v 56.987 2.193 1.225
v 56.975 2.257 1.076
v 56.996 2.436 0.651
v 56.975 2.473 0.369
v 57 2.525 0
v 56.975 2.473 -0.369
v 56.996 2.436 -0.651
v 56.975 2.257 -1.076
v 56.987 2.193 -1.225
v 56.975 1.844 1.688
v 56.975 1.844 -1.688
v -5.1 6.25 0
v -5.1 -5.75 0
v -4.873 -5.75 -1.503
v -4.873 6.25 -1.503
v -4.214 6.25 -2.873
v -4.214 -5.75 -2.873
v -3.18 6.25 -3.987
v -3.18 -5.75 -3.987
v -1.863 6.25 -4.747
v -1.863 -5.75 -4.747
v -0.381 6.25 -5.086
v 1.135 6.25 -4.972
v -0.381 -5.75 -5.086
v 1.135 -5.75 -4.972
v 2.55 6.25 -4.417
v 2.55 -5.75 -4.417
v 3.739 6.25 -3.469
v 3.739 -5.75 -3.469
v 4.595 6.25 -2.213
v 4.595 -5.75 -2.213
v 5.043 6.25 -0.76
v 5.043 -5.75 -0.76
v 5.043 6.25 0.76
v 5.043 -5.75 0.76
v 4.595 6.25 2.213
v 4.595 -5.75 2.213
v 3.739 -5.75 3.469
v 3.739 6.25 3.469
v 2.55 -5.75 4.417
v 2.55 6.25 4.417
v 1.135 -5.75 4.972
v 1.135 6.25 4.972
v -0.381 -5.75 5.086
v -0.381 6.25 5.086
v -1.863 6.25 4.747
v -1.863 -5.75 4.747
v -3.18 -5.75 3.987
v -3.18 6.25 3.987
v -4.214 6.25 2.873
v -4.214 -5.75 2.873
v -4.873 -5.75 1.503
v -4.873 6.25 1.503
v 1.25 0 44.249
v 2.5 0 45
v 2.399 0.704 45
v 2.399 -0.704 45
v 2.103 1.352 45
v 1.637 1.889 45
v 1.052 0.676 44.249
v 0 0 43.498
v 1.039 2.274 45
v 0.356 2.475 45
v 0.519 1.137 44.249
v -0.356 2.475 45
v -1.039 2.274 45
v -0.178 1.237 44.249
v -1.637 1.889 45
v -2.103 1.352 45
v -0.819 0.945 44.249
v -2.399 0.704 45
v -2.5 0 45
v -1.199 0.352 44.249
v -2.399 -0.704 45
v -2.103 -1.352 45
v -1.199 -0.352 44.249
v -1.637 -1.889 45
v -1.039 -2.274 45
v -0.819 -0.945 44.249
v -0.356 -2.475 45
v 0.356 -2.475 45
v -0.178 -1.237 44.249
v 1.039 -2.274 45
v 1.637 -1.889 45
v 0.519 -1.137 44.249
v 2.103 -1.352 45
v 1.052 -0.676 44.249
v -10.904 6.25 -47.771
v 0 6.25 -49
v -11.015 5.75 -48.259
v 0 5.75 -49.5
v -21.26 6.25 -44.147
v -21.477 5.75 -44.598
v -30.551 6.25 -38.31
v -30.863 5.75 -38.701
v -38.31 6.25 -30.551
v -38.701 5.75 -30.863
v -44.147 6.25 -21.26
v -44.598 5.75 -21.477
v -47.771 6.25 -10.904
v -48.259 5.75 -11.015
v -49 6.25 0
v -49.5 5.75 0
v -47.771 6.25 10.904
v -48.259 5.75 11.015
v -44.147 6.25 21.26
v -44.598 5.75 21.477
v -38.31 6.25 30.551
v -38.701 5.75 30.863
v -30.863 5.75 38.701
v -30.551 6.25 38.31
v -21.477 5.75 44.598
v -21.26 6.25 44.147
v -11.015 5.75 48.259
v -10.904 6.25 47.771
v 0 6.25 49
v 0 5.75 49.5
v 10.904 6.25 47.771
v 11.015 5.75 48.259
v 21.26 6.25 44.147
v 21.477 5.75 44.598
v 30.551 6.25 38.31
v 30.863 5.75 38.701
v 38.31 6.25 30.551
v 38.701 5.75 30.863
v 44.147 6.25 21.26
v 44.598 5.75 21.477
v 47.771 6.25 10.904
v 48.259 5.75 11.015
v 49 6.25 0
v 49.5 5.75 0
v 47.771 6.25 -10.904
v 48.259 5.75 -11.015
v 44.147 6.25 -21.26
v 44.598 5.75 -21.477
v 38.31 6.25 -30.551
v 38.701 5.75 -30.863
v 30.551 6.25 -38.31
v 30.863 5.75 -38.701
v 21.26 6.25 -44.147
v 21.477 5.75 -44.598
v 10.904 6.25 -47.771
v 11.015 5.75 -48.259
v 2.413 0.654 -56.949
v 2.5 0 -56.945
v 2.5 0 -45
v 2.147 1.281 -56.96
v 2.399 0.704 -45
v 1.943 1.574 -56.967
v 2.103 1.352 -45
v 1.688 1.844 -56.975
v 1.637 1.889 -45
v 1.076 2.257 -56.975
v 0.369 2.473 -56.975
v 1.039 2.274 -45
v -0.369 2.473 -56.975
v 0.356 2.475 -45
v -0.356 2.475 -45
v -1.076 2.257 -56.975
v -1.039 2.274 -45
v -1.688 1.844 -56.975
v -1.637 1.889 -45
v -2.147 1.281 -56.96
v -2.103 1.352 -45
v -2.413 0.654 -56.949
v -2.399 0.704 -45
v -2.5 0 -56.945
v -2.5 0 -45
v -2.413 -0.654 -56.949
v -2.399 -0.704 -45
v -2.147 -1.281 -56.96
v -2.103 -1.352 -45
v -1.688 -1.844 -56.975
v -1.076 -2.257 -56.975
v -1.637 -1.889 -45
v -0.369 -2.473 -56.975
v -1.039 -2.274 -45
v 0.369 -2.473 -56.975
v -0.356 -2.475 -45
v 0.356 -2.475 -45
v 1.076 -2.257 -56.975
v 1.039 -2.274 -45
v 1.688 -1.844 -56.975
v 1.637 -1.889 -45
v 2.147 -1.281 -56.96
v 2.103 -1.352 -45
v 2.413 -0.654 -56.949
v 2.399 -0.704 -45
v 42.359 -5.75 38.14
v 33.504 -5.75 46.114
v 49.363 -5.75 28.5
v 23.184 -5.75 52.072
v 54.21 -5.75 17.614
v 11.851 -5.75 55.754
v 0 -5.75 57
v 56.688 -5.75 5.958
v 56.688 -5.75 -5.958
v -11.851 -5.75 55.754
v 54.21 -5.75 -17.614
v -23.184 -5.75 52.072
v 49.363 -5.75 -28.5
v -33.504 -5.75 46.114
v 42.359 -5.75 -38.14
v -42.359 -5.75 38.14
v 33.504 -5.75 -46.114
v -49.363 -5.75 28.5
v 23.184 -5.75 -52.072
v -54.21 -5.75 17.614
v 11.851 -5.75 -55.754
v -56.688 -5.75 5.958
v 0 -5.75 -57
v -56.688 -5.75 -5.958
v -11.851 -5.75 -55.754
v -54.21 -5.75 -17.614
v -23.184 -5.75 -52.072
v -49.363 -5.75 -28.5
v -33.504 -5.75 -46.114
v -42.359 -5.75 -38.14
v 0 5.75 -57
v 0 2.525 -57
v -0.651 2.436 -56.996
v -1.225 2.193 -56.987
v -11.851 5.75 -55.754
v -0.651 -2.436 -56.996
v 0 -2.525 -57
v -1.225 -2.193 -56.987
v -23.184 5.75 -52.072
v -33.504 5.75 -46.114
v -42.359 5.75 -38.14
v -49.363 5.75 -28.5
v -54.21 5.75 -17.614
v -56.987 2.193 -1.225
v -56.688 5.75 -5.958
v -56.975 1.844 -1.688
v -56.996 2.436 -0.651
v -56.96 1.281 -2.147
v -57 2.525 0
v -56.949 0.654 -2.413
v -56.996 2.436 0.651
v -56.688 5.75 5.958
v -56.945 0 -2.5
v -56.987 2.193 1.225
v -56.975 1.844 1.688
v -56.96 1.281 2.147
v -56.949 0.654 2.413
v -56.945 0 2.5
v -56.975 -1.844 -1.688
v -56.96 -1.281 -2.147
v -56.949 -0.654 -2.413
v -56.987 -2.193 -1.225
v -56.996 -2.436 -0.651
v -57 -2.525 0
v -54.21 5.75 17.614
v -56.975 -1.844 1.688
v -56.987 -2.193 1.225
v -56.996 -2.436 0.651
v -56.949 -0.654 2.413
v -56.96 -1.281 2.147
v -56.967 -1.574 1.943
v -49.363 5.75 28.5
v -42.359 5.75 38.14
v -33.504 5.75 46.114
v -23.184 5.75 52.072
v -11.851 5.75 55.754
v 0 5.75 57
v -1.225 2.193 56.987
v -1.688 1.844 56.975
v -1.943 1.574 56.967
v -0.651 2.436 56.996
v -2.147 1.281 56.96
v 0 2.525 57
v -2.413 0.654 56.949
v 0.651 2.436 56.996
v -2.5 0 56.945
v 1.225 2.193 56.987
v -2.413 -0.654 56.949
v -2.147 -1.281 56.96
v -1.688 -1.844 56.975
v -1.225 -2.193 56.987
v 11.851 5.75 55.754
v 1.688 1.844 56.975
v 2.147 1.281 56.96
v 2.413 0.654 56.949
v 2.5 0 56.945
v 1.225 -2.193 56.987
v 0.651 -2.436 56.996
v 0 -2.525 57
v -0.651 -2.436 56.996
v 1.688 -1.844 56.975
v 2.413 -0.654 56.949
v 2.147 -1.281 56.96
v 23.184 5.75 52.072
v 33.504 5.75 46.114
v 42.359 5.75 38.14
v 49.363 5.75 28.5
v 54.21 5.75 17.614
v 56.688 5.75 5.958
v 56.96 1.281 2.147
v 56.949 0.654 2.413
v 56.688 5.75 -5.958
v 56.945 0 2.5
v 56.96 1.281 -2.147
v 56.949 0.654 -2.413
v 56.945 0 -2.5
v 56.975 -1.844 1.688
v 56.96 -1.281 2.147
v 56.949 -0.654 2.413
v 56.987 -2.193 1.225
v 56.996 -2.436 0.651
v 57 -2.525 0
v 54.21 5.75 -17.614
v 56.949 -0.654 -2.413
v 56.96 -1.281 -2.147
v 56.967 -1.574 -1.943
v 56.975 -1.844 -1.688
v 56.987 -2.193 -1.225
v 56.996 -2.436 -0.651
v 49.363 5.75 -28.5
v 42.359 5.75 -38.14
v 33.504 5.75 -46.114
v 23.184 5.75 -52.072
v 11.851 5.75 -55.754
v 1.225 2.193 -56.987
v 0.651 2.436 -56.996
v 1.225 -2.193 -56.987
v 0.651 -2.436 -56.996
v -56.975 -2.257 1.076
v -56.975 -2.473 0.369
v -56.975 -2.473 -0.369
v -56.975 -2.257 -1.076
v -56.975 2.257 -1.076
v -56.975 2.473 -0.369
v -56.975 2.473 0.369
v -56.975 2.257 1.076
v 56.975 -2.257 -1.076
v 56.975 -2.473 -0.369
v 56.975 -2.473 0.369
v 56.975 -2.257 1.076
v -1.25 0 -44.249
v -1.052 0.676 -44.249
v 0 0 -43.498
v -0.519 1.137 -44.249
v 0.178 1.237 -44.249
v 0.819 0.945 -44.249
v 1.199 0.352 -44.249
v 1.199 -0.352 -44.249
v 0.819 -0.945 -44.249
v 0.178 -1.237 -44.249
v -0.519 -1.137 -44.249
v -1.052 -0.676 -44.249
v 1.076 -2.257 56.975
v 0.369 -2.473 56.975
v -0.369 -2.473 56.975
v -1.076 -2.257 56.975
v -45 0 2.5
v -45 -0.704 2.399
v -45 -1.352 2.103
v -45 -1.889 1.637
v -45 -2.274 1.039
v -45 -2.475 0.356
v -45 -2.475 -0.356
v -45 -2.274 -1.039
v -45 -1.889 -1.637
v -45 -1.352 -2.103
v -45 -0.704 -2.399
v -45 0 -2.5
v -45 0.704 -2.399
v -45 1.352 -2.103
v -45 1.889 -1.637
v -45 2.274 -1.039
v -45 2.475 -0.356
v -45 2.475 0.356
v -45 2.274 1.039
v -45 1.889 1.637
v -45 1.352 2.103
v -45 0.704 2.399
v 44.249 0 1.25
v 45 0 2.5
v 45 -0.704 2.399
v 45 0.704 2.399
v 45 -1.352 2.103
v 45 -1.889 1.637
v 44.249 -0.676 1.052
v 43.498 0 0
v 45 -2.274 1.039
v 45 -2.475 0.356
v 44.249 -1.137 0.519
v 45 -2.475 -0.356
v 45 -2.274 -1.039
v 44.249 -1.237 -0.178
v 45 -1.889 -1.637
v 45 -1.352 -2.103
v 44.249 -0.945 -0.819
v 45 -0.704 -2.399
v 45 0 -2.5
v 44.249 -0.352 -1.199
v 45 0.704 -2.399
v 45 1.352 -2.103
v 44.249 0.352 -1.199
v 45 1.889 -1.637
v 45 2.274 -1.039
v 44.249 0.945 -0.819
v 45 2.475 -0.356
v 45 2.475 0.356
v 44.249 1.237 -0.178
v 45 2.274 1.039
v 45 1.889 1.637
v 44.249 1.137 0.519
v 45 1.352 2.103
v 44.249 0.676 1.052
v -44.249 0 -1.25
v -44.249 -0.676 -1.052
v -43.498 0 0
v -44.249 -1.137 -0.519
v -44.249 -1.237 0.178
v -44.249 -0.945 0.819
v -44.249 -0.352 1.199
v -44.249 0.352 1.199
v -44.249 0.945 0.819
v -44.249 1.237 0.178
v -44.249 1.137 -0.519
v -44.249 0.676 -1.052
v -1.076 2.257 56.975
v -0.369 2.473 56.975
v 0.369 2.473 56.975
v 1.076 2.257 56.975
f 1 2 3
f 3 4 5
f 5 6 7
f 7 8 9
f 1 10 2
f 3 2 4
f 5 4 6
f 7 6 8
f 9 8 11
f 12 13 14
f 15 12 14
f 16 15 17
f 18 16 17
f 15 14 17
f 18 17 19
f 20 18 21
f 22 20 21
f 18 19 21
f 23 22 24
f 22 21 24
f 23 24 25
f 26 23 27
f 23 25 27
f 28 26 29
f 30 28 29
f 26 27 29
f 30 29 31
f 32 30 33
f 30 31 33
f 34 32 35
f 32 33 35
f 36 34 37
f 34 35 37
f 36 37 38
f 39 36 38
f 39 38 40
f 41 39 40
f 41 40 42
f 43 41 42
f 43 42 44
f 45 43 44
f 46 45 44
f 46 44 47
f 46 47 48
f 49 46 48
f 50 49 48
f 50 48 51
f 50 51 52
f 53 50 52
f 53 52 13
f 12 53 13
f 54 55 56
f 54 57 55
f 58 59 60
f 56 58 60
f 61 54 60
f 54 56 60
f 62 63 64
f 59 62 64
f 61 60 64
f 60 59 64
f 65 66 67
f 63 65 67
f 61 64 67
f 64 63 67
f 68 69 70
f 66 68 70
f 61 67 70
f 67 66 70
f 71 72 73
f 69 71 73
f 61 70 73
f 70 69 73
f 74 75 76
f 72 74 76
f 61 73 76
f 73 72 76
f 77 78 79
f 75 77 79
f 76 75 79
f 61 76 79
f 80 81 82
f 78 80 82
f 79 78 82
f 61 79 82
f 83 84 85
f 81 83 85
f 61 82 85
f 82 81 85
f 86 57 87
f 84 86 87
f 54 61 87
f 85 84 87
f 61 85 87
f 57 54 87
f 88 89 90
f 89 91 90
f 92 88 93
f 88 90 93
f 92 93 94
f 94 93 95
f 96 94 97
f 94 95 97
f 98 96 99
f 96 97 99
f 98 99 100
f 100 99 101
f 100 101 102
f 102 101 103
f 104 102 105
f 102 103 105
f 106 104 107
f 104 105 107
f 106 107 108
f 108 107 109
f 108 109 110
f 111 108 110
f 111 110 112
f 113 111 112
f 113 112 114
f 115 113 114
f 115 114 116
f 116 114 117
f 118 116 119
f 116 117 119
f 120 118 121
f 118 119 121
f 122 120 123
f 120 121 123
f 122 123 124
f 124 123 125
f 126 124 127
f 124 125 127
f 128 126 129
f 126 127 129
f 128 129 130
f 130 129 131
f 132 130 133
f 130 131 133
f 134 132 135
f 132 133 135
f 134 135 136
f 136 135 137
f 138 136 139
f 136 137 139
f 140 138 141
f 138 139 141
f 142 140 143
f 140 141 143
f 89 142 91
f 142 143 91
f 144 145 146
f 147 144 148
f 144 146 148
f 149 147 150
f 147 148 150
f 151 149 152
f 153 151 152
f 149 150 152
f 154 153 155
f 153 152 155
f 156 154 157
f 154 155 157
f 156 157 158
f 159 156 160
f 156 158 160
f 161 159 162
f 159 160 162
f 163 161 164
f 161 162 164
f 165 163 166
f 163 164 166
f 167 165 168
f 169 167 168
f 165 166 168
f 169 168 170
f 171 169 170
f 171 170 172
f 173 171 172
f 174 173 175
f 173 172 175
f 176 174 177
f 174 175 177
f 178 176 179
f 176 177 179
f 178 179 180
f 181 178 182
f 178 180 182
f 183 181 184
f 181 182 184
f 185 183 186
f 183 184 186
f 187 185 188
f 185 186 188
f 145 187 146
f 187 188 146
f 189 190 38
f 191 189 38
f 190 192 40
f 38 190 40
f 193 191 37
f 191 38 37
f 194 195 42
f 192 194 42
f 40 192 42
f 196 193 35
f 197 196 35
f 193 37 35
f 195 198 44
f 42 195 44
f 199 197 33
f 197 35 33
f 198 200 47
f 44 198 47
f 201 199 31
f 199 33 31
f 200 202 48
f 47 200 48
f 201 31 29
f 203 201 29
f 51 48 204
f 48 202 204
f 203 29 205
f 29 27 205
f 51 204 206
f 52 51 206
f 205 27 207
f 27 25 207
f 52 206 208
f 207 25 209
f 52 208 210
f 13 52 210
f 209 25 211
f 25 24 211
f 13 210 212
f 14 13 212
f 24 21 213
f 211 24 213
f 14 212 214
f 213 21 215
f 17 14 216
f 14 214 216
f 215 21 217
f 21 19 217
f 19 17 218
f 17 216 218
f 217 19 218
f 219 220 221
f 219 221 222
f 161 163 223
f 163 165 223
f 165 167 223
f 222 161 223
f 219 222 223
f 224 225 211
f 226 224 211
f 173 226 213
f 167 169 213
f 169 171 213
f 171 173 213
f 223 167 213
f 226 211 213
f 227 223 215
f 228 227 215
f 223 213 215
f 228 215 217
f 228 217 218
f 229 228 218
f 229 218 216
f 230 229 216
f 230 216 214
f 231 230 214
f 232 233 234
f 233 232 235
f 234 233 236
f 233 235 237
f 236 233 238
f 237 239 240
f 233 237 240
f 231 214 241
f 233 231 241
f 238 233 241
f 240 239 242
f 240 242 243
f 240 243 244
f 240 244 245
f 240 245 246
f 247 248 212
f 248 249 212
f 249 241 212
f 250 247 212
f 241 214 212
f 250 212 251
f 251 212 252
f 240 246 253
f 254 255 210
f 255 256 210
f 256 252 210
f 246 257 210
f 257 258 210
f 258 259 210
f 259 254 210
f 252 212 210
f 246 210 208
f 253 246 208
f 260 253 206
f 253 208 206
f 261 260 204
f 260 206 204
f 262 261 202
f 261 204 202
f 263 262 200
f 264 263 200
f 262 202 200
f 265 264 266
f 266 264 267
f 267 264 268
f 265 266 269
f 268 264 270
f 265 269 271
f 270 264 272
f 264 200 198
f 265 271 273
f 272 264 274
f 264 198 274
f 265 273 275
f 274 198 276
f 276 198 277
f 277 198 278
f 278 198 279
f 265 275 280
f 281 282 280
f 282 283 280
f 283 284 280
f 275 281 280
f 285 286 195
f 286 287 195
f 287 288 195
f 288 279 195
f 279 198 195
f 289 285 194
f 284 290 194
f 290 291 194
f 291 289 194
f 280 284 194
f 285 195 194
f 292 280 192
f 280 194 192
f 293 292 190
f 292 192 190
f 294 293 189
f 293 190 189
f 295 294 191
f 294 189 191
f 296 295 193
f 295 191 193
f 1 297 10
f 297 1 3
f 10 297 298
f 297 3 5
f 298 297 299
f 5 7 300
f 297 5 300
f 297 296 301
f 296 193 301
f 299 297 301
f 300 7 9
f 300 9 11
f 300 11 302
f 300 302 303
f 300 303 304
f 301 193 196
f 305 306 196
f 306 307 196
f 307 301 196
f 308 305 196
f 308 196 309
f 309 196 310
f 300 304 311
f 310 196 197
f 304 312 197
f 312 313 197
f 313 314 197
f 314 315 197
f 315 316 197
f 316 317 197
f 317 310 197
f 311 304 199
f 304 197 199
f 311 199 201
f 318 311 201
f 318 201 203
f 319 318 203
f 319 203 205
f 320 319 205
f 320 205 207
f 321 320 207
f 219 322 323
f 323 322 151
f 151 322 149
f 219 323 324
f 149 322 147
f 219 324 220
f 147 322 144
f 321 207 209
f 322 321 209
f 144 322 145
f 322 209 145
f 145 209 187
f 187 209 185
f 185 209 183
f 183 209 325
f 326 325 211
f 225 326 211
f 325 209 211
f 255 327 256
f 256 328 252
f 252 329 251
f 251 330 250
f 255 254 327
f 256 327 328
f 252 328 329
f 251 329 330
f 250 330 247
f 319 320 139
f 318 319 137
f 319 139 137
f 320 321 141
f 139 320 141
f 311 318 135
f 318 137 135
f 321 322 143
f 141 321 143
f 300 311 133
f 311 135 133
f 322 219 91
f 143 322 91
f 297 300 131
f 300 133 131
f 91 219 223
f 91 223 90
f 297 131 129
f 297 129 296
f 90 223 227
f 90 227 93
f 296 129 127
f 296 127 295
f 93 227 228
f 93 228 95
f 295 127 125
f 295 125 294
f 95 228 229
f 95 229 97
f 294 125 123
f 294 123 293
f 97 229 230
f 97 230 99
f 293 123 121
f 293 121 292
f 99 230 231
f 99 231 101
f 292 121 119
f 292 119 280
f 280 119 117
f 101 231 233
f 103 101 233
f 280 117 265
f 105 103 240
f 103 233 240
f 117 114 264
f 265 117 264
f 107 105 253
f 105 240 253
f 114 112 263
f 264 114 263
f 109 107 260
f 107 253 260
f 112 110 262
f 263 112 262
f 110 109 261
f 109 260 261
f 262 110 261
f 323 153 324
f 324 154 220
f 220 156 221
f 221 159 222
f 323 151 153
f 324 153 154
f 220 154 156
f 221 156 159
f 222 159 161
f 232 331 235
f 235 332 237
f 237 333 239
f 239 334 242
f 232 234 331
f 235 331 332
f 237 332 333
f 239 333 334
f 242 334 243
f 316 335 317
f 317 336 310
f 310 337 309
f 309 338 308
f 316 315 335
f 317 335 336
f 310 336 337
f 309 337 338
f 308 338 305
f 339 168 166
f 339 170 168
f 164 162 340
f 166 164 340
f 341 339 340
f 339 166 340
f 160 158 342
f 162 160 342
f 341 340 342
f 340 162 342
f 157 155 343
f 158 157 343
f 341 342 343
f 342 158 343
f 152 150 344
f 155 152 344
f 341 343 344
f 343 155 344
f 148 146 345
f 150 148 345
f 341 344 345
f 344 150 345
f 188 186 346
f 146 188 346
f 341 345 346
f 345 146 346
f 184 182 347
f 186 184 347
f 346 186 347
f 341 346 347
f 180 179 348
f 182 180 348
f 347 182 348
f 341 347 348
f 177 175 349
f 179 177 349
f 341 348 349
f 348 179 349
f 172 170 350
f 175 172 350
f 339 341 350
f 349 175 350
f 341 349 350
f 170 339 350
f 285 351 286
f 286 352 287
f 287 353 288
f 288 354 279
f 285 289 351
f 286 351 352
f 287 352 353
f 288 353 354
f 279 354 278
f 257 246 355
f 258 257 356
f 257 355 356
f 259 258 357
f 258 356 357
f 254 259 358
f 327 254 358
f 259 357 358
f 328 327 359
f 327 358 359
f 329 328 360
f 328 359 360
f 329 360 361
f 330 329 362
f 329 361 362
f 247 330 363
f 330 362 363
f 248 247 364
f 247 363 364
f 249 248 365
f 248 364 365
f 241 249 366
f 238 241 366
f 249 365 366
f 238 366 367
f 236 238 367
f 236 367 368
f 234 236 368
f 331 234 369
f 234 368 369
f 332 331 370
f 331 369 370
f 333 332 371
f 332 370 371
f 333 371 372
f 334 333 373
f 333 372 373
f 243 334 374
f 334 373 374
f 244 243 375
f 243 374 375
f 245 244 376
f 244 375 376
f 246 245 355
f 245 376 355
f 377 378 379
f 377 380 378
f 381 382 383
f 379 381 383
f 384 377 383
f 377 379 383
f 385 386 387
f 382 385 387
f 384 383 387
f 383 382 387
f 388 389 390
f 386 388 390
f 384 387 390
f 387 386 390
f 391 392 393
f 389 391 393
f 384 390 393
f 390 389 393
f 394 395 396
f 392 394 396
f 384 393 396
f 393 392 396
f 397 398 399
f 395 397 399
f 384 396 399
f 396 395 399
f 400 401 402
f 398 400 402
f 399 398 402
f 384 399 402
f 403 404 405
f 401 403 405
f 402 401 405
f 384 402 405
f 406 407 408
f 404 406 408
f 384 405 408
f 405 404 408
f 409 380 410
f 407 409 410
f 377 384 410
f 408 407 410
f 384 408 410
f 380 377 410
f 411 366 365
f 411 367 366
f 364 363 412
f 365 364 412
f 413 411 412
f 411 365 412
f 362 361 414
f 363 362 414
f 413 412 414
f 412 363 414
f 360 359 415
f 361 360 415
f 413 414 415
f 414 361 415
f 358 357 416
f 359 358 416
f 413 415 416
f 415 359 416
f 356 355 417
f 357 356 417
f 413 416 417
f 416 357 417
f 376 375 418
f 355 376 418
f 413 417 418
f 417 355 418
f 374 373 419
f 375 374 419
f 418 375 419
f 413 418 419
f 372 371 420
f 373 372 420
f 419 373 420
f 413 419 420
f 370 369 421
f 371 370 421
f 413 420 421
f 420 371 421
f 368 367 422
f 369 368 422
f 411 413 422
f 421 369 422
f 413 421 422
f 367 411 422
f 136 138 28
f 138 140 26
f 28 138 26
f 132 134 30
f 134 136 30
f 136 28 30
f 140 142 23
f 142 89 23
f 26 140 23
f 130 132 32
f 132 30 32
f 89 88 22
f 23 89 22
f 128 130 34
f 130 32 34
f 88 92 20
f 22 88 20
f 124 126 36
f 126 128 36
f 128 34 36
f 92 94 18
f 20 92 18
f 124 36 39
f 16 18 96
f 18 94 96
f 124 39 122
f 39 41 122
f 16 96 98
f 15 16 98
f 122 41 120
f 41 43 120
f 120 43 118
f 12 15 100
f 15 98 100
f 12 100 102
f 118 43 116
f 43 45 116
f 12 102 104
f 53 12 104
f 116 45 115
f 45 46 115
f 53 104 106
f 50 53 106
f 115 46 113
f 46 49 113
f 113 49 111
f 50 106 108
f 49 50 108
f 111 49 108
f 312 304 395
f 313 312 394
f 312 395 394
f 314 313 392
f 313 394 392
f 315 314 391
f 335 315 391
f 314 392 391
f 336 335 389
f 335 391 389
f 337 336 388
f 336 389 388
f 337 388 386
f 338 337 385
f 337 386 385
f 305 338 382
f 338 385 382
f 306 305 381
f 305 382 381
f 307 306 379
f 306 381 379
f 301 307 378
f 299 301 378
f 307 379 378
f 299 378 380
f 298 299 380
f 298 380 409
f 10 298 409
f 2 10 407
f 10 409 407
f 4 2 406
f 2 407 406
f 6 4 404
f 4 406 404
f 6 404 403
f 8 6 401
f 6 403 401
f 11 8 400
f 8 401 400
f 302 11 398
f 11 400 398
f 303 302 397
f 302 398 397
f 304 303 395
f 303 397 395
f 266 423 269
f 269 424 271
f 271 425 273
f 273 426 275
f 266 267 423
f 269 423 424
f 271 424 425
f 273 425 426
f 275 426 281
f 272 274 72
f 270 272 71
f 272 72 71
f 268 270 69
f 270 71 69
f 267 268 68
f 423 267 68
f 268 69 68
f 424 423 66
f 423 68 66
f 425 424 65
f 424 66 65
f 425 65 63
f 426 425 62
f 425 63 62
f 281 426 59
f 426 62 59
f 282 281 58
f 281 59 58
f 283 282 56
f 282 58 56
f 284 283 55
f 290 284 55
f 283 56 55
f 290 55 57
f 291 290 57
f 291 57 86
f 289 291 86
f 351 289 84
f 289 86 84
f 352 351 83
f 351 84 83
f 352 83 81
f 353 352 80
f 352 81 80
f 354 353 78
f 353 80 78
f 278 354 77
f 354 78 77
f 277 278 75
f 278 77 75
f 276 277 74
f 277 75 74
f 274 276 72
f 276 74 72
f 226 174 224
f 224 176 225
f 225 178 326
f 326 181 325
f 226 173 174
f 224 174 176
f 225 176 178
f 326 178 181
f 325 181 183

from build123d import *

# Parameters (mm, degrees)
F_5_0MM_DOWEL_HOLE1_D                     = 5
F_5_0MM_DOWEL_HOLE1_DEPTH                 = 12
F_5_0MM_DOWEL_HOLE1_CSINK_D               = 5.05
F_5_0MM_DOWEL_HOLE1_CSINK_ANGLE           = 90
F_5_0MM_DOWEL_HOLE1_TIP                   = 1.502151548
F_5_0MM_DOWEL_HOLE1_ON_FACE_2_D           = 5
F_5_0MM_DOWEL_HOLE1_ON_FACE_2_DEPTH       = 12
F_5_0MM_DOWEL_HOLE1_ON_FACE_2_CSINK_D     = 5.05
F_5_0MM_DOWEL_HOLE1_ON_FACE_2_CSINK_ANGLE = 90
F_5_0MM_DOWEL_HOLE1_ON_FACE_2_TIP         = 1.502151548
F_5_0MM_DOWEL_HOLE1_ON_FACE_3_D           = 5
F_5_0MM_DOWEL_HOLE1_ON_FACE_3_DEPTH       = 12
F_5_0MM_DOWEL_HOLE1_ON_FACE_3_CSINK_D     = 5.05
F_5_0MM_DOWEL_HOLE1_ON_FACE_3_CSINK_ANGLE = 90
F_5_0MM_DOWEL_HOLE1_ON_FACE_3_TIP         = 1.502151548
F_5_0MM_DOWEL_HOLE1_ON_FACE_4_D           = 5
F_5_0MM_DOWEL_HOLE1_ON_FACE_4_DEPTH       = 12
F_5_0MM_DOWEL_HOLE1_ON_FACE_4_CSINK_D     = 5.05
F_5_0MM_DOWEL_HOLE1_ON_FACE_4_CSINK_ANGLE = 90
F_5_0MM_DOWEL_HOLE1_ON_FACE_4_TIP         = 1.502151548
M12_TAPPED_HOLE1_D                        = 10.2


with BuildPart() as part:
    # Sketch1 → Revolve1 (revolve)
    with BuildSketch(Plane.XY, mode=Mode.PRIVATE) as revolve1_sk:
        Polygon((0, 6.25), (49, 6.25), (49.5, 5.75), (57, 5.75), (57, -5.75), (0, -5.75), align=None)
    revolve(revolve1_sk.sketch.rotate(Axis((0, 0, 0), (0, 1, 0)), 90), axis=Axis((0, 0, 0), (0, 1, 0)))

    # Ø5.0mm Dowel Hole1
    with Locations(Plane(origin=(57, 0, 0), x_dir=(0, 0, 1), z_dir=(1, 0, 0))):
        with Locations((0, 0)):
            CounterSinkHole(F_5_0MM_DOWEL_HOLE1_D / 2, F_5_0MM_DOWEL_HOLE1_CSINK_D / 2, depth=F_5_0MM_DOWEL_HOLE1_DEPTH, counter_sink_angle=F_5_0MM_DOWEL_HOLE1_CSINK_ANGLE)
            with Locations((0, 0, -(F_5_0MM_DOWEL_HOLE1_DEPTH + F_5_0MM_DOWEL_HOLE1_TIP / 2))):  # 118° drill point
                Cone(0, F_5_0MM_DOWEL_HOLE1_D / 2, F_5_0MM_DOWEL_HOLE1_TIP, mode=Mode.SUBTRACT)

    # Ø5.0mm Dowel Hole1 on face 2
    with Locations(Plane.XY.offset(57)):
        with Locations((0, 0)):
            CounterSinkHole(F_5_0MM_DOWEL_HOLE1_ON_FACE_2_D / 2, F_5_0MM_DOWEL_HOLE1_ON_FACE_2_CSINK_D / 2, depth=F_5_0MM_DOWEL_HOLE1_ON_FACE_2_DEPTH, counter_sink_angle=F_5_0MM_DOWEL_HOLE1_ON_FACE_2_CSINK_ANGLE)
            with Locations((0, 0, -(F_5_0MM_DOWEL_HOLE1_ON_FACE_2_DEPTH + F_5_0MM_DOWEL_HOLE1_ON_FACE_2_TIP / 2))):  # 118° drill point
                Cone(0, F_5_0MM_DOWEL_HOLE1_ON_FACE_2_D / 2, F_5_0MM_DOWEL_HOLE1_ON_FACE_2_TIP, mode=Mode.SUBTRACT)

    # Ø5.0mm Dowel Hole1 on face 3
    with Locations(Plane(origin=(-57, 0, 0), x_dir=(0, 0, -1), z_dir=(-1, 0, 0))):
        with Locations((0, 0)):
            CounterSinkHole(F_5_0MM_DOWEL_HOLE1_ON_FACE_3_D / 2, F_5_0MM_DOWEL_HOLE1_ON_FACE_3_CSINK_D / 2, depth=F_5_0MM_DOWEL_HOLE1_ON_FACE_3_DEPTH, counter_sink_angle=F_5_0MM_DOWEL_HOLE1_ON_FACE_3_CSINK_ANGLE)
            with Locations((0, 0, -(F_5_0MM_DOWEL_HOLE1_ON_FACE_3_DEPTH + F_5_0MM_DOWEL_HOLE1_ON_FACE_3_TIP / 2))):  # 118° drill point
                Cone(0, F_5_0MM_DOWEL_HOLE1_ON_FACE_3_D / 2, F_5_0MM_DOWEL_HOLE1_ON_FACE_3_TIP, mode=Mode.SUBTRACT)

    # Ø5.0mm Dowel Hole1 on face 4
    with Locations(Plane(origin=(0, 0, -57), x_dir=(-1, 0, 0), z_dir=(0, 0, -1))):
        with Locations((0, 0)):
            CounterSinkHole(F_5_0MM_DOWEL_HOLE1_ON_FACE_4_D / 2, F_5_0MM_DOWEL_HOLE1_ON_FACE_4_CSINK_D / 2, depth=F_5_0MM_DOWEL_HOLE1_ON_FACE_4_DEPTH, counter_sink_angle=F_5_0MM_DOWEL_HOLE1_ON_FACE_4_CSINK_ANGLE)
            with Locations((0, 0, -(F_5_0MM_DOWEL_HOLE1_ON_FACE_4_DEPTH + F_5_0MM_DOWEL_HOLE1_ON_FACE_4_TIP / 2))):  # 118° drill point
                Cone(0, F_5_0MM_DOWEL_HOLE1_ON_FACE_4_D / 2, F_5_0MM_DOWEL_HOLE1_ON_FACE_4_TIP, mode=Mode.SUBTRACT)

    # M12 Tapped Hole1 (through all)
    with Locations(Plane(origin=(0, 6.25, 0), x_dir=(1, 0, 0), z_dir=(0, 1, 0))):
        with Locations((0, 0)):
            Hole(M12_TAPPED_HOLE1_D / 2)


solid = part.part
